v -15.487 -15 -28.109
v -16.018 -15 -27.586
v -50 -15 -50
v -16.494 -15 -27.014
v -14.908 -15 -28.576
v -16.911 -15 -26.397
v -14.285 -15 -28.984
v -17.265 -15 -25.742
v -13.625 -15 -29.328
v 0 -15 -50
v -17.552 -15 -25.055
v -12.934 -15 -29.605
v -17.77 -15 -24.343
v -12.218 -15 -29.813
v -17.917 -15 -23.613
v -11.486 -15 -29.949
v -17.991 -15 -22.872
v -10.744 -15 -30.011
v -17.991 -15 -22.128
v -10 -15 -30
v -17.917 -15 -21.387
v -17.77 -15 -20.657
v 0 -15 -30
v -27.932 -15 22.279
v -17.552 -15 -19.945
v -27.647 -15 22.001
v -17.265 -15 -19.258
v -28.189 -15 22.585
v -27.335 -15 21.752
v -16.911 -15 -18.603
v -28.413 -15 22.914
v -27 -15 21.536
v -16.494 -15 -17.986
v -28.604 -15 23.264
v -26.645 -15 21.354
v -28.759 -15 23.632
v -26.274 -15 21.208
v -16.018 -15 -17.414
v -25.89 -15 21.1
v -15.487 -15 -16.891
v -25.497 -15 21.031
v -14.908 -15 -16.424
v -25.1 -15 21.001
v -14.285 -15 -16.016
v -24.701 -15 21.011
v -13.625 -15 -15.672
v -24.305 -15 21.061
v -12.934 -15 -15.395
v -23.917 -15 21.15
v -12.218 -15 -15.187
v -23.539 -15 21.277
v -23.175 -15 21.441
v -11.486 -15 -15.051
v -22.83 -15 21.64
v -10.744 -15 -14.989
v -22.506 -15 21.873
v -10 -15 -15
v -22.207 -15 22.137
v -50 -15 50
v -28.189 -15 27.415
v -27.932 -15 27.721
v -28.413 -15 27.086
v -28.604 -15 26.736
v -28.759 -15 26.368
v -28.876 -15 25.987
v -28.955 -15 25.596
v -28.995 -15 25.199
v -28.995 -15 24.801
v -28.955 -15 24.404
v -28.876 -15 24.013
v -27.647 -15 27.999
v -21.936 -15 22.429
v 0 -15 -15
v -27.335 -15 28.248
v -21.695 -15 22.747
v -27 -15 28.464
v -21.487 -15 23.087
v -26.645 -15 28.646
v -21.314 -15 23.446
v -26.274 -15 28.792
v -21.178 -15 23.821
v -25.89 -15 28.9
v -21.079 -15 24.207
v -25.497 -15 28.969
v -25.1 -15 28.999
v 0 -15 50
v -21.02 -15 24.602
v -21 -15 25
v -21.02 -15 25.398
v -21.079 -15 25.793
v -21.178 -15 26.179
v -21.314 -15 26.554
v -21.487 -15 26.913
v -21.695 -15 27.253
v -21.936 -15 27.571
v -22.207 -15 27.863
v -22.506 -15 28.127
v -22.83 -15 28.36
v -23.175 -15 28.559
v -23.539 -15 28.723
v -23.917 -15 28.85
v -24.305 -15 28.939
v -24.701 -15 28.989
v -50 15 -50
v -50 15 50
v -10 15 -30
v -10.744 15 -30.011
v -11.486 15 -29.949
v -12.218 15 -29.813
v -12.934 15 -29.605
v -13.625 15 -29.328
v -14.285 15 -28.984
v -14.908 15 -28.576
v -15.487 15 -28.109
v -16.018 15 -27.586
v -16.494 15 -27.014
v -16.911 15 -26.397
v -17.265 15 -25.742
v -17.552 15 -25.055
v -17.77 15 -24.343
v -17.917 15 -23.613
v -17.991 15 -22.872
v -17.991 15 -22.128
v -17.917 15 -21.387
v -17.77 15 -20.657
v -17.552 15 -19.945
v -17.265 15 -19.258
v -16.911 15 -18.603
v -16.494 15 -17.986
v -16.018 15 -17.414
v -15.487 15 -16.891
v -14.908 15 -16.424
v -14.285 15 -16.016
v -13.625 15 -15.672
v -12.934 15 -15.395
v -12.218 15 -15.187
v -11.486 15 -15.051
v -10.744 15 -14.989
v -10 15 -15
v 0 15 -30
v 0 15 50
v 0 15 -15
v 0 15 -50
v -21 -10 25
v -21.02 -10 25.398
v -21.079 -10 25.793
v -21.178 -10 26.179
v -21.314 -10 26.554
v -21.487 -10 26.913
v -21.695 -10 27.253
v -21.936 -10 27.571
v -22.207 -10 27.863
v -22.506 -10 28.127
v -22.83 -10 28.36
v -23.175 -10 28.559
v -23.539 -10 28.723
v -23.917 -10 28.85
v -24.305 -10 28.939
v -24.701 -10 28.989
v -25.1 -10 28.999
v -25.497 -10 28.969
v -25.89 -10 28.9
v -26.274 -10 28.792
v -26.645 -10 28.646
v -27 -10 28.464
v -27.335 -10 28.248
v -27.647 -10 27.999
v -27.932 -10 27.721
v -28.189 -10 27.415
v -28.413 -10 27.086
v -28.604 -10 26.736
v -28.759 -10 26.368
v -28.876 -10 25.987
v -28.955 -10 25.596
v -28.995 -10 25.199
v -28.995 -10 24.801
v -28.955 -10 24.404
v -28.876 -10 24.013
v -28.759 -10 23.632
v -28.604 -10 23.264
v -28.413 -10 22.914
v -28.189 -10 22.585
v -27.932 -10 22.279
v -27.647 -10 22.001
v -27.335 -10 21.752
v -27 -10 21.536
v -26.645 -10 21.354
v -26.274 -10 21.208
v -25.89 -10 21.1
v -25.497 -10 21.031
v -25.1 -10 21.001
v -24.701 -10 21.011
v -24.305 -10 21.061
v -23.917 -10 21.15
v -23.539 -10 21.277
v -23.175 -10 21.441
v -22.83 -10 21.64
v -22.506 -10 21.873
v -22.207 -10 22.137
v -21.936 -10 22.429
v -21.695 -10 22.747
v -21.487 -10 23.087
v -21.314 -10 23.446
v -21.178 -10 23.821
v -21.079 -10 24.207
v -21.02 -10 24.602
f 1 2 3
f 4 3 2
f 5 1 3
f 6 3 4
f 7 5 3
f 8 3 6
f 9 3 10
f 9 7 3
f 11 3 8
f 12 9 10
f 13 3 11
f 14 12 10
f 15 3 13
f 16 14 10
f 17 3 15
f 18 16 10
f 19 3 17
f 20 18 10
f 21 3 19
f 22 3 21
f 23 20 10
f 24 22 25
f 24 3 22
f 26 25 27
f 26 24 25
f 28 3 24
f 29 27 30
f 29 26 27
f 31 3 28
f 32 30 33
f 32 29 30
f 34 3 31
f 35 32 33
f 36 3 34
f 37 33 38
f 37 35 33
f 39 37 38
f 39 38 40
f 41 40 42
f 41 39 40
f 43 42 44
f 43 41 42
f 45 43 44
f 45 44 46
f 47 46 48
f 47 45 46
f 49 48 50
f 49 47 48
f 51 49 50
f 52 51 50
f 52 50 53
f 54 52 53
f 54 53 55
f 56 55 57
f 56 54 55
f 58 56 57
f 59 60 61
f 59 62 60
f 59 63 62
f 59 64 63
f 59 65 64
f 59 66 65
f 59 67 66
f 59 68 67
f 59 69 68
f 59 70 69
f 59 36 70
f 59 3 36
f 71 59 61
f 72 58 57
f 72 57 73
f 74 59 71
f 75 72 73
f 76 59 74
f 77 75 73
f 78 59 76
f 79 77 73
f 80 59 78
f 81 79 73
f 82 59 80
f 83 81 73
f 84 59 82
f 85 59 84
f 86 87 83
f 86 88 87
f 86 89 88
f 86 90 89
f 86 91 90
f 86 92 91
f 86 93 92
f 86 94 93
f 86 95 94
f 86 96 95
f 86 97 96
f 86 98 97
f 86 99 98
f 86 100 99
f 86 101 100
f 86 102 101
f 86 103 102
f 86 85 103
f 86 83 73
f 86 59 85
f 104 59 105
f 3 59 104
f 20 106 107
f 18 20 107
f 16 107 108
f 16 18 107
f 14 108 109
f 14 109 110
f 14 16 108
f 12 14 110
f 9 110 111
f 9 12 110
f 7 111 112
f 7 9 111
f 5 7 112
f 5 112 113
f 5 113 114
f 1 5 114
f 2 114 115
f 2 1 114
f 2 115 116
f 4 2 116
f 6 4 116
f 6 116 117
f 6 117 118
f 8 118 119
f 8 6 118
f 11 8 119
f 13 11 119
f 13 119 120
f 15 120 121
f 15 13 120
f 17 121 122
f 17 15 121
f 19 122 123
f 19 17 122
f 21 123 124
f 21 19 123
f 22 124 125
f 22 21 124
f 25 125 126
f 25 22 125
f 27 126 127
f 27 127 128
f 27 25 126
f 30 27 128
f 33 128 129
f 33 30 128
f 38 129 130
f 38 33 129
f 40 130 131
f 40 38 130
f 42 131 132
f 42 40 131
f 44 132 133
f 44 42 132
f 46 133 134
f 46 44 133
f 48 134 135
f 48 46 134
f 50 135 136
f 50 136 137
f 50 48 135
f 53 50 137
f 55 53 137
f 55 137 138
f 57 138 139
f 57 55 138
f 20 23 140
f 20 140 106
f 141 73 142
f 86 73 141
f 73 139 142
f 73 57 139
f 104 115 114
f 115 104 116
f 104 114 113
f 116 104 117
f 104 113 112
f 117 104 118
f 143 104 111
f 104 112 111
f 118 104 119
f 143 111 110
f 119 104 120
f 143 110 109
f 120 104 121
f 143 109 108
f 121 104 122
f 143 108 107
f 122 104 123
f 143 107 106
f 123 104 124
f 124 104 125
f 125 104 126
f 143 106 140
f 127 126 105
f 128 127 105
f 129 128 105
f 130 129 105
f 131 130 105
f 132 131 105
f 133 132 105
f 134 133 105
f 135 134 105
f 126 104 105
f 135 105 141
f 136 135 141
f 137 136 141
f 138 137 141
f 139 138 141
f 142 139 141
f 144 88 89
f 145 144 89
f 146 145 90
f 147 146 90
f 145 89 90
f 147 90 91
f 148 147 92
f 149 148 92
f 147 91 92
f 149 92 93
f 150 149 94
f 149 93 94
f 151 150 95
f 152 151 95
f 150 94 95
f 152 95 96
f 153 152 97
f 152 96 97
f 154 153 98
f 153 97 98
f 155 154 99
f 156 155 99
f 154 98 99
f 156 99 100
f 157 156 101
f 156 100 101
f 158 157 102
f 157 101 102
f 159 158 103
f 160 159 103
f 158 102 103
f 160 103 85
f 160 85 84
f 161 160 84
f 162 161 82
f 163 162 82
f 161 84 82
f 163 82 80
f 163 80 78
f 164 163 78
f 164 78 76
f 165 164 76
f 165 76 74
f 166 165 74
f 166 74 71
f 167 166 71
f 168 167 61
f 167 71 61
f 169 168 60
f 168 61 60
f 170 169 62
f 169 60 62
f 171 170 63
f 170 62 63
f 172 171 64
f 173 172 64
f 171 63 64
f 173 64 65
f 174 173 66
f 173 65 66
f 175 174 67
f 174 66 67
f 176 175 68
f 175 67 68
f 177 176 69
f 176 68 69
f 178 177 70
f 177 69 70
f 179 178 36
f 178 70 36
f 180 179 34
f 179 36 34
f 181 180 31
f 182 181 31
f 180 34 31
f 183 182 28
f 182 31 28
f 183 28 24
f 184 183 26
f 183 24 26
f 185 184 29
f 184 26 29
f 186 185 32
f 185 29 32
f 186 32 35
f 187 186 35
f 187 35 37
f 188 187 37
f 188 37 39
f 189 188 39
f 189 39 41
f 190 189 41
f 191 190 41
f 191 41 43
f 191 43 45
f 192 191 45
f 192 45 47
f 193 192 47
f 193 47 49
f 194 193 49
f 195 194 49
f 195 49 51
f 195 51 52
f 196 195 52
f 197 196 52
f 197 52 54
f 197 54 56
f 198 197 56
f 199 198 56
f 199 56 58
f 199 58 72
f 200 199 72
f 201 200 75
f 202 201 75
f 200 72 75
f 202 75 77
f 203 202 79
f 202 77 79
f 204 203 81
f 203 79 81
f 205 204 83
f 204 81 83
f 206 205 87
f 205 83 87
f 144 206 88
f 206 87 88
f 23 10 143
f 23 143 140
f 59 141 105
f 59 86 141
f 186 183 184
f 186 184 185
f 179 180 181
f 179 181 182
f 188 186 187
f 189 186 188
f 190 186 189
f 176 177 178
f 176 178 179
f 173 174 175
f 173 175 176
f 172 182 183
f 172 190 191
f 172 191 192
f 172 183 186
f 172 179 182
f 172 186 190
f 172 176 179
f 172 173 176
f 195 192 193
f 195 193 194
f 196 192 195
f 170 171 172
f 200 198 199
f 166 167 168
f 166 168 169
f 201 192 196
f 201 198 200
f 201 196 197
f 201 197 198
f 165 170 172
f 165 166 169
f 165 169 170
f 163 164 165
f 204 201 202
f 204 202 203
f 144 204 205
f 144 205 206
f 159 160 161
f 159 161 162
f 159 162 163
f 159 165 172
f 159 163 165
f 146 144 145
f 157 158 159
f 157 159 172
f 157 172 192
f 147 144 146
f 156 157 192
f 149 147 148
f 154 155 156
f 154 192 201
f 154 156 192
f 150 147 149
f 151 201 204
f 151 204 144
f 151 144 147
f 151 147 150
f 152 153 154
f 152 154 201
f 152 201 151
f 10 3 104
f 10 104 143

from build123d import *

# Parameters (mm, degrees)
F1_DEPTH = 15
F2_R     = 4
F3_DEPTH = 5


with BuildPart() as f1:
    # F0 (on Front) → F1 (new body, symmetric)
    with BuildSketch(Plane.XZ):
        with BuildLine():
            Line((0, 50), (-50, 50))
            Line((-50, 50), (-50, -50))
            Line((-50, -50), (0, -50))
            Line((0, -50), (0, -30))
            Line((0, -30), (-10, -30))
            ThreePointArc((-10, -30), (-18, -22.5), (-10, -15))
            Line((-10, -15), (0, -15))
            Line((0, -15), (0, 50))
        make_face()
    extrude(amount=F1_DEPTH, both=True)

    # F2 (on face) → F3 (cut)
    with BuildSketch(Plane.XZ.offset(15)):
        with Locations((-25, 25)):
            Circle(F2_R)
    extrude(amount=-F3_DEPTH, mode=Mode.SUBTRACT)


solid = f1.part
